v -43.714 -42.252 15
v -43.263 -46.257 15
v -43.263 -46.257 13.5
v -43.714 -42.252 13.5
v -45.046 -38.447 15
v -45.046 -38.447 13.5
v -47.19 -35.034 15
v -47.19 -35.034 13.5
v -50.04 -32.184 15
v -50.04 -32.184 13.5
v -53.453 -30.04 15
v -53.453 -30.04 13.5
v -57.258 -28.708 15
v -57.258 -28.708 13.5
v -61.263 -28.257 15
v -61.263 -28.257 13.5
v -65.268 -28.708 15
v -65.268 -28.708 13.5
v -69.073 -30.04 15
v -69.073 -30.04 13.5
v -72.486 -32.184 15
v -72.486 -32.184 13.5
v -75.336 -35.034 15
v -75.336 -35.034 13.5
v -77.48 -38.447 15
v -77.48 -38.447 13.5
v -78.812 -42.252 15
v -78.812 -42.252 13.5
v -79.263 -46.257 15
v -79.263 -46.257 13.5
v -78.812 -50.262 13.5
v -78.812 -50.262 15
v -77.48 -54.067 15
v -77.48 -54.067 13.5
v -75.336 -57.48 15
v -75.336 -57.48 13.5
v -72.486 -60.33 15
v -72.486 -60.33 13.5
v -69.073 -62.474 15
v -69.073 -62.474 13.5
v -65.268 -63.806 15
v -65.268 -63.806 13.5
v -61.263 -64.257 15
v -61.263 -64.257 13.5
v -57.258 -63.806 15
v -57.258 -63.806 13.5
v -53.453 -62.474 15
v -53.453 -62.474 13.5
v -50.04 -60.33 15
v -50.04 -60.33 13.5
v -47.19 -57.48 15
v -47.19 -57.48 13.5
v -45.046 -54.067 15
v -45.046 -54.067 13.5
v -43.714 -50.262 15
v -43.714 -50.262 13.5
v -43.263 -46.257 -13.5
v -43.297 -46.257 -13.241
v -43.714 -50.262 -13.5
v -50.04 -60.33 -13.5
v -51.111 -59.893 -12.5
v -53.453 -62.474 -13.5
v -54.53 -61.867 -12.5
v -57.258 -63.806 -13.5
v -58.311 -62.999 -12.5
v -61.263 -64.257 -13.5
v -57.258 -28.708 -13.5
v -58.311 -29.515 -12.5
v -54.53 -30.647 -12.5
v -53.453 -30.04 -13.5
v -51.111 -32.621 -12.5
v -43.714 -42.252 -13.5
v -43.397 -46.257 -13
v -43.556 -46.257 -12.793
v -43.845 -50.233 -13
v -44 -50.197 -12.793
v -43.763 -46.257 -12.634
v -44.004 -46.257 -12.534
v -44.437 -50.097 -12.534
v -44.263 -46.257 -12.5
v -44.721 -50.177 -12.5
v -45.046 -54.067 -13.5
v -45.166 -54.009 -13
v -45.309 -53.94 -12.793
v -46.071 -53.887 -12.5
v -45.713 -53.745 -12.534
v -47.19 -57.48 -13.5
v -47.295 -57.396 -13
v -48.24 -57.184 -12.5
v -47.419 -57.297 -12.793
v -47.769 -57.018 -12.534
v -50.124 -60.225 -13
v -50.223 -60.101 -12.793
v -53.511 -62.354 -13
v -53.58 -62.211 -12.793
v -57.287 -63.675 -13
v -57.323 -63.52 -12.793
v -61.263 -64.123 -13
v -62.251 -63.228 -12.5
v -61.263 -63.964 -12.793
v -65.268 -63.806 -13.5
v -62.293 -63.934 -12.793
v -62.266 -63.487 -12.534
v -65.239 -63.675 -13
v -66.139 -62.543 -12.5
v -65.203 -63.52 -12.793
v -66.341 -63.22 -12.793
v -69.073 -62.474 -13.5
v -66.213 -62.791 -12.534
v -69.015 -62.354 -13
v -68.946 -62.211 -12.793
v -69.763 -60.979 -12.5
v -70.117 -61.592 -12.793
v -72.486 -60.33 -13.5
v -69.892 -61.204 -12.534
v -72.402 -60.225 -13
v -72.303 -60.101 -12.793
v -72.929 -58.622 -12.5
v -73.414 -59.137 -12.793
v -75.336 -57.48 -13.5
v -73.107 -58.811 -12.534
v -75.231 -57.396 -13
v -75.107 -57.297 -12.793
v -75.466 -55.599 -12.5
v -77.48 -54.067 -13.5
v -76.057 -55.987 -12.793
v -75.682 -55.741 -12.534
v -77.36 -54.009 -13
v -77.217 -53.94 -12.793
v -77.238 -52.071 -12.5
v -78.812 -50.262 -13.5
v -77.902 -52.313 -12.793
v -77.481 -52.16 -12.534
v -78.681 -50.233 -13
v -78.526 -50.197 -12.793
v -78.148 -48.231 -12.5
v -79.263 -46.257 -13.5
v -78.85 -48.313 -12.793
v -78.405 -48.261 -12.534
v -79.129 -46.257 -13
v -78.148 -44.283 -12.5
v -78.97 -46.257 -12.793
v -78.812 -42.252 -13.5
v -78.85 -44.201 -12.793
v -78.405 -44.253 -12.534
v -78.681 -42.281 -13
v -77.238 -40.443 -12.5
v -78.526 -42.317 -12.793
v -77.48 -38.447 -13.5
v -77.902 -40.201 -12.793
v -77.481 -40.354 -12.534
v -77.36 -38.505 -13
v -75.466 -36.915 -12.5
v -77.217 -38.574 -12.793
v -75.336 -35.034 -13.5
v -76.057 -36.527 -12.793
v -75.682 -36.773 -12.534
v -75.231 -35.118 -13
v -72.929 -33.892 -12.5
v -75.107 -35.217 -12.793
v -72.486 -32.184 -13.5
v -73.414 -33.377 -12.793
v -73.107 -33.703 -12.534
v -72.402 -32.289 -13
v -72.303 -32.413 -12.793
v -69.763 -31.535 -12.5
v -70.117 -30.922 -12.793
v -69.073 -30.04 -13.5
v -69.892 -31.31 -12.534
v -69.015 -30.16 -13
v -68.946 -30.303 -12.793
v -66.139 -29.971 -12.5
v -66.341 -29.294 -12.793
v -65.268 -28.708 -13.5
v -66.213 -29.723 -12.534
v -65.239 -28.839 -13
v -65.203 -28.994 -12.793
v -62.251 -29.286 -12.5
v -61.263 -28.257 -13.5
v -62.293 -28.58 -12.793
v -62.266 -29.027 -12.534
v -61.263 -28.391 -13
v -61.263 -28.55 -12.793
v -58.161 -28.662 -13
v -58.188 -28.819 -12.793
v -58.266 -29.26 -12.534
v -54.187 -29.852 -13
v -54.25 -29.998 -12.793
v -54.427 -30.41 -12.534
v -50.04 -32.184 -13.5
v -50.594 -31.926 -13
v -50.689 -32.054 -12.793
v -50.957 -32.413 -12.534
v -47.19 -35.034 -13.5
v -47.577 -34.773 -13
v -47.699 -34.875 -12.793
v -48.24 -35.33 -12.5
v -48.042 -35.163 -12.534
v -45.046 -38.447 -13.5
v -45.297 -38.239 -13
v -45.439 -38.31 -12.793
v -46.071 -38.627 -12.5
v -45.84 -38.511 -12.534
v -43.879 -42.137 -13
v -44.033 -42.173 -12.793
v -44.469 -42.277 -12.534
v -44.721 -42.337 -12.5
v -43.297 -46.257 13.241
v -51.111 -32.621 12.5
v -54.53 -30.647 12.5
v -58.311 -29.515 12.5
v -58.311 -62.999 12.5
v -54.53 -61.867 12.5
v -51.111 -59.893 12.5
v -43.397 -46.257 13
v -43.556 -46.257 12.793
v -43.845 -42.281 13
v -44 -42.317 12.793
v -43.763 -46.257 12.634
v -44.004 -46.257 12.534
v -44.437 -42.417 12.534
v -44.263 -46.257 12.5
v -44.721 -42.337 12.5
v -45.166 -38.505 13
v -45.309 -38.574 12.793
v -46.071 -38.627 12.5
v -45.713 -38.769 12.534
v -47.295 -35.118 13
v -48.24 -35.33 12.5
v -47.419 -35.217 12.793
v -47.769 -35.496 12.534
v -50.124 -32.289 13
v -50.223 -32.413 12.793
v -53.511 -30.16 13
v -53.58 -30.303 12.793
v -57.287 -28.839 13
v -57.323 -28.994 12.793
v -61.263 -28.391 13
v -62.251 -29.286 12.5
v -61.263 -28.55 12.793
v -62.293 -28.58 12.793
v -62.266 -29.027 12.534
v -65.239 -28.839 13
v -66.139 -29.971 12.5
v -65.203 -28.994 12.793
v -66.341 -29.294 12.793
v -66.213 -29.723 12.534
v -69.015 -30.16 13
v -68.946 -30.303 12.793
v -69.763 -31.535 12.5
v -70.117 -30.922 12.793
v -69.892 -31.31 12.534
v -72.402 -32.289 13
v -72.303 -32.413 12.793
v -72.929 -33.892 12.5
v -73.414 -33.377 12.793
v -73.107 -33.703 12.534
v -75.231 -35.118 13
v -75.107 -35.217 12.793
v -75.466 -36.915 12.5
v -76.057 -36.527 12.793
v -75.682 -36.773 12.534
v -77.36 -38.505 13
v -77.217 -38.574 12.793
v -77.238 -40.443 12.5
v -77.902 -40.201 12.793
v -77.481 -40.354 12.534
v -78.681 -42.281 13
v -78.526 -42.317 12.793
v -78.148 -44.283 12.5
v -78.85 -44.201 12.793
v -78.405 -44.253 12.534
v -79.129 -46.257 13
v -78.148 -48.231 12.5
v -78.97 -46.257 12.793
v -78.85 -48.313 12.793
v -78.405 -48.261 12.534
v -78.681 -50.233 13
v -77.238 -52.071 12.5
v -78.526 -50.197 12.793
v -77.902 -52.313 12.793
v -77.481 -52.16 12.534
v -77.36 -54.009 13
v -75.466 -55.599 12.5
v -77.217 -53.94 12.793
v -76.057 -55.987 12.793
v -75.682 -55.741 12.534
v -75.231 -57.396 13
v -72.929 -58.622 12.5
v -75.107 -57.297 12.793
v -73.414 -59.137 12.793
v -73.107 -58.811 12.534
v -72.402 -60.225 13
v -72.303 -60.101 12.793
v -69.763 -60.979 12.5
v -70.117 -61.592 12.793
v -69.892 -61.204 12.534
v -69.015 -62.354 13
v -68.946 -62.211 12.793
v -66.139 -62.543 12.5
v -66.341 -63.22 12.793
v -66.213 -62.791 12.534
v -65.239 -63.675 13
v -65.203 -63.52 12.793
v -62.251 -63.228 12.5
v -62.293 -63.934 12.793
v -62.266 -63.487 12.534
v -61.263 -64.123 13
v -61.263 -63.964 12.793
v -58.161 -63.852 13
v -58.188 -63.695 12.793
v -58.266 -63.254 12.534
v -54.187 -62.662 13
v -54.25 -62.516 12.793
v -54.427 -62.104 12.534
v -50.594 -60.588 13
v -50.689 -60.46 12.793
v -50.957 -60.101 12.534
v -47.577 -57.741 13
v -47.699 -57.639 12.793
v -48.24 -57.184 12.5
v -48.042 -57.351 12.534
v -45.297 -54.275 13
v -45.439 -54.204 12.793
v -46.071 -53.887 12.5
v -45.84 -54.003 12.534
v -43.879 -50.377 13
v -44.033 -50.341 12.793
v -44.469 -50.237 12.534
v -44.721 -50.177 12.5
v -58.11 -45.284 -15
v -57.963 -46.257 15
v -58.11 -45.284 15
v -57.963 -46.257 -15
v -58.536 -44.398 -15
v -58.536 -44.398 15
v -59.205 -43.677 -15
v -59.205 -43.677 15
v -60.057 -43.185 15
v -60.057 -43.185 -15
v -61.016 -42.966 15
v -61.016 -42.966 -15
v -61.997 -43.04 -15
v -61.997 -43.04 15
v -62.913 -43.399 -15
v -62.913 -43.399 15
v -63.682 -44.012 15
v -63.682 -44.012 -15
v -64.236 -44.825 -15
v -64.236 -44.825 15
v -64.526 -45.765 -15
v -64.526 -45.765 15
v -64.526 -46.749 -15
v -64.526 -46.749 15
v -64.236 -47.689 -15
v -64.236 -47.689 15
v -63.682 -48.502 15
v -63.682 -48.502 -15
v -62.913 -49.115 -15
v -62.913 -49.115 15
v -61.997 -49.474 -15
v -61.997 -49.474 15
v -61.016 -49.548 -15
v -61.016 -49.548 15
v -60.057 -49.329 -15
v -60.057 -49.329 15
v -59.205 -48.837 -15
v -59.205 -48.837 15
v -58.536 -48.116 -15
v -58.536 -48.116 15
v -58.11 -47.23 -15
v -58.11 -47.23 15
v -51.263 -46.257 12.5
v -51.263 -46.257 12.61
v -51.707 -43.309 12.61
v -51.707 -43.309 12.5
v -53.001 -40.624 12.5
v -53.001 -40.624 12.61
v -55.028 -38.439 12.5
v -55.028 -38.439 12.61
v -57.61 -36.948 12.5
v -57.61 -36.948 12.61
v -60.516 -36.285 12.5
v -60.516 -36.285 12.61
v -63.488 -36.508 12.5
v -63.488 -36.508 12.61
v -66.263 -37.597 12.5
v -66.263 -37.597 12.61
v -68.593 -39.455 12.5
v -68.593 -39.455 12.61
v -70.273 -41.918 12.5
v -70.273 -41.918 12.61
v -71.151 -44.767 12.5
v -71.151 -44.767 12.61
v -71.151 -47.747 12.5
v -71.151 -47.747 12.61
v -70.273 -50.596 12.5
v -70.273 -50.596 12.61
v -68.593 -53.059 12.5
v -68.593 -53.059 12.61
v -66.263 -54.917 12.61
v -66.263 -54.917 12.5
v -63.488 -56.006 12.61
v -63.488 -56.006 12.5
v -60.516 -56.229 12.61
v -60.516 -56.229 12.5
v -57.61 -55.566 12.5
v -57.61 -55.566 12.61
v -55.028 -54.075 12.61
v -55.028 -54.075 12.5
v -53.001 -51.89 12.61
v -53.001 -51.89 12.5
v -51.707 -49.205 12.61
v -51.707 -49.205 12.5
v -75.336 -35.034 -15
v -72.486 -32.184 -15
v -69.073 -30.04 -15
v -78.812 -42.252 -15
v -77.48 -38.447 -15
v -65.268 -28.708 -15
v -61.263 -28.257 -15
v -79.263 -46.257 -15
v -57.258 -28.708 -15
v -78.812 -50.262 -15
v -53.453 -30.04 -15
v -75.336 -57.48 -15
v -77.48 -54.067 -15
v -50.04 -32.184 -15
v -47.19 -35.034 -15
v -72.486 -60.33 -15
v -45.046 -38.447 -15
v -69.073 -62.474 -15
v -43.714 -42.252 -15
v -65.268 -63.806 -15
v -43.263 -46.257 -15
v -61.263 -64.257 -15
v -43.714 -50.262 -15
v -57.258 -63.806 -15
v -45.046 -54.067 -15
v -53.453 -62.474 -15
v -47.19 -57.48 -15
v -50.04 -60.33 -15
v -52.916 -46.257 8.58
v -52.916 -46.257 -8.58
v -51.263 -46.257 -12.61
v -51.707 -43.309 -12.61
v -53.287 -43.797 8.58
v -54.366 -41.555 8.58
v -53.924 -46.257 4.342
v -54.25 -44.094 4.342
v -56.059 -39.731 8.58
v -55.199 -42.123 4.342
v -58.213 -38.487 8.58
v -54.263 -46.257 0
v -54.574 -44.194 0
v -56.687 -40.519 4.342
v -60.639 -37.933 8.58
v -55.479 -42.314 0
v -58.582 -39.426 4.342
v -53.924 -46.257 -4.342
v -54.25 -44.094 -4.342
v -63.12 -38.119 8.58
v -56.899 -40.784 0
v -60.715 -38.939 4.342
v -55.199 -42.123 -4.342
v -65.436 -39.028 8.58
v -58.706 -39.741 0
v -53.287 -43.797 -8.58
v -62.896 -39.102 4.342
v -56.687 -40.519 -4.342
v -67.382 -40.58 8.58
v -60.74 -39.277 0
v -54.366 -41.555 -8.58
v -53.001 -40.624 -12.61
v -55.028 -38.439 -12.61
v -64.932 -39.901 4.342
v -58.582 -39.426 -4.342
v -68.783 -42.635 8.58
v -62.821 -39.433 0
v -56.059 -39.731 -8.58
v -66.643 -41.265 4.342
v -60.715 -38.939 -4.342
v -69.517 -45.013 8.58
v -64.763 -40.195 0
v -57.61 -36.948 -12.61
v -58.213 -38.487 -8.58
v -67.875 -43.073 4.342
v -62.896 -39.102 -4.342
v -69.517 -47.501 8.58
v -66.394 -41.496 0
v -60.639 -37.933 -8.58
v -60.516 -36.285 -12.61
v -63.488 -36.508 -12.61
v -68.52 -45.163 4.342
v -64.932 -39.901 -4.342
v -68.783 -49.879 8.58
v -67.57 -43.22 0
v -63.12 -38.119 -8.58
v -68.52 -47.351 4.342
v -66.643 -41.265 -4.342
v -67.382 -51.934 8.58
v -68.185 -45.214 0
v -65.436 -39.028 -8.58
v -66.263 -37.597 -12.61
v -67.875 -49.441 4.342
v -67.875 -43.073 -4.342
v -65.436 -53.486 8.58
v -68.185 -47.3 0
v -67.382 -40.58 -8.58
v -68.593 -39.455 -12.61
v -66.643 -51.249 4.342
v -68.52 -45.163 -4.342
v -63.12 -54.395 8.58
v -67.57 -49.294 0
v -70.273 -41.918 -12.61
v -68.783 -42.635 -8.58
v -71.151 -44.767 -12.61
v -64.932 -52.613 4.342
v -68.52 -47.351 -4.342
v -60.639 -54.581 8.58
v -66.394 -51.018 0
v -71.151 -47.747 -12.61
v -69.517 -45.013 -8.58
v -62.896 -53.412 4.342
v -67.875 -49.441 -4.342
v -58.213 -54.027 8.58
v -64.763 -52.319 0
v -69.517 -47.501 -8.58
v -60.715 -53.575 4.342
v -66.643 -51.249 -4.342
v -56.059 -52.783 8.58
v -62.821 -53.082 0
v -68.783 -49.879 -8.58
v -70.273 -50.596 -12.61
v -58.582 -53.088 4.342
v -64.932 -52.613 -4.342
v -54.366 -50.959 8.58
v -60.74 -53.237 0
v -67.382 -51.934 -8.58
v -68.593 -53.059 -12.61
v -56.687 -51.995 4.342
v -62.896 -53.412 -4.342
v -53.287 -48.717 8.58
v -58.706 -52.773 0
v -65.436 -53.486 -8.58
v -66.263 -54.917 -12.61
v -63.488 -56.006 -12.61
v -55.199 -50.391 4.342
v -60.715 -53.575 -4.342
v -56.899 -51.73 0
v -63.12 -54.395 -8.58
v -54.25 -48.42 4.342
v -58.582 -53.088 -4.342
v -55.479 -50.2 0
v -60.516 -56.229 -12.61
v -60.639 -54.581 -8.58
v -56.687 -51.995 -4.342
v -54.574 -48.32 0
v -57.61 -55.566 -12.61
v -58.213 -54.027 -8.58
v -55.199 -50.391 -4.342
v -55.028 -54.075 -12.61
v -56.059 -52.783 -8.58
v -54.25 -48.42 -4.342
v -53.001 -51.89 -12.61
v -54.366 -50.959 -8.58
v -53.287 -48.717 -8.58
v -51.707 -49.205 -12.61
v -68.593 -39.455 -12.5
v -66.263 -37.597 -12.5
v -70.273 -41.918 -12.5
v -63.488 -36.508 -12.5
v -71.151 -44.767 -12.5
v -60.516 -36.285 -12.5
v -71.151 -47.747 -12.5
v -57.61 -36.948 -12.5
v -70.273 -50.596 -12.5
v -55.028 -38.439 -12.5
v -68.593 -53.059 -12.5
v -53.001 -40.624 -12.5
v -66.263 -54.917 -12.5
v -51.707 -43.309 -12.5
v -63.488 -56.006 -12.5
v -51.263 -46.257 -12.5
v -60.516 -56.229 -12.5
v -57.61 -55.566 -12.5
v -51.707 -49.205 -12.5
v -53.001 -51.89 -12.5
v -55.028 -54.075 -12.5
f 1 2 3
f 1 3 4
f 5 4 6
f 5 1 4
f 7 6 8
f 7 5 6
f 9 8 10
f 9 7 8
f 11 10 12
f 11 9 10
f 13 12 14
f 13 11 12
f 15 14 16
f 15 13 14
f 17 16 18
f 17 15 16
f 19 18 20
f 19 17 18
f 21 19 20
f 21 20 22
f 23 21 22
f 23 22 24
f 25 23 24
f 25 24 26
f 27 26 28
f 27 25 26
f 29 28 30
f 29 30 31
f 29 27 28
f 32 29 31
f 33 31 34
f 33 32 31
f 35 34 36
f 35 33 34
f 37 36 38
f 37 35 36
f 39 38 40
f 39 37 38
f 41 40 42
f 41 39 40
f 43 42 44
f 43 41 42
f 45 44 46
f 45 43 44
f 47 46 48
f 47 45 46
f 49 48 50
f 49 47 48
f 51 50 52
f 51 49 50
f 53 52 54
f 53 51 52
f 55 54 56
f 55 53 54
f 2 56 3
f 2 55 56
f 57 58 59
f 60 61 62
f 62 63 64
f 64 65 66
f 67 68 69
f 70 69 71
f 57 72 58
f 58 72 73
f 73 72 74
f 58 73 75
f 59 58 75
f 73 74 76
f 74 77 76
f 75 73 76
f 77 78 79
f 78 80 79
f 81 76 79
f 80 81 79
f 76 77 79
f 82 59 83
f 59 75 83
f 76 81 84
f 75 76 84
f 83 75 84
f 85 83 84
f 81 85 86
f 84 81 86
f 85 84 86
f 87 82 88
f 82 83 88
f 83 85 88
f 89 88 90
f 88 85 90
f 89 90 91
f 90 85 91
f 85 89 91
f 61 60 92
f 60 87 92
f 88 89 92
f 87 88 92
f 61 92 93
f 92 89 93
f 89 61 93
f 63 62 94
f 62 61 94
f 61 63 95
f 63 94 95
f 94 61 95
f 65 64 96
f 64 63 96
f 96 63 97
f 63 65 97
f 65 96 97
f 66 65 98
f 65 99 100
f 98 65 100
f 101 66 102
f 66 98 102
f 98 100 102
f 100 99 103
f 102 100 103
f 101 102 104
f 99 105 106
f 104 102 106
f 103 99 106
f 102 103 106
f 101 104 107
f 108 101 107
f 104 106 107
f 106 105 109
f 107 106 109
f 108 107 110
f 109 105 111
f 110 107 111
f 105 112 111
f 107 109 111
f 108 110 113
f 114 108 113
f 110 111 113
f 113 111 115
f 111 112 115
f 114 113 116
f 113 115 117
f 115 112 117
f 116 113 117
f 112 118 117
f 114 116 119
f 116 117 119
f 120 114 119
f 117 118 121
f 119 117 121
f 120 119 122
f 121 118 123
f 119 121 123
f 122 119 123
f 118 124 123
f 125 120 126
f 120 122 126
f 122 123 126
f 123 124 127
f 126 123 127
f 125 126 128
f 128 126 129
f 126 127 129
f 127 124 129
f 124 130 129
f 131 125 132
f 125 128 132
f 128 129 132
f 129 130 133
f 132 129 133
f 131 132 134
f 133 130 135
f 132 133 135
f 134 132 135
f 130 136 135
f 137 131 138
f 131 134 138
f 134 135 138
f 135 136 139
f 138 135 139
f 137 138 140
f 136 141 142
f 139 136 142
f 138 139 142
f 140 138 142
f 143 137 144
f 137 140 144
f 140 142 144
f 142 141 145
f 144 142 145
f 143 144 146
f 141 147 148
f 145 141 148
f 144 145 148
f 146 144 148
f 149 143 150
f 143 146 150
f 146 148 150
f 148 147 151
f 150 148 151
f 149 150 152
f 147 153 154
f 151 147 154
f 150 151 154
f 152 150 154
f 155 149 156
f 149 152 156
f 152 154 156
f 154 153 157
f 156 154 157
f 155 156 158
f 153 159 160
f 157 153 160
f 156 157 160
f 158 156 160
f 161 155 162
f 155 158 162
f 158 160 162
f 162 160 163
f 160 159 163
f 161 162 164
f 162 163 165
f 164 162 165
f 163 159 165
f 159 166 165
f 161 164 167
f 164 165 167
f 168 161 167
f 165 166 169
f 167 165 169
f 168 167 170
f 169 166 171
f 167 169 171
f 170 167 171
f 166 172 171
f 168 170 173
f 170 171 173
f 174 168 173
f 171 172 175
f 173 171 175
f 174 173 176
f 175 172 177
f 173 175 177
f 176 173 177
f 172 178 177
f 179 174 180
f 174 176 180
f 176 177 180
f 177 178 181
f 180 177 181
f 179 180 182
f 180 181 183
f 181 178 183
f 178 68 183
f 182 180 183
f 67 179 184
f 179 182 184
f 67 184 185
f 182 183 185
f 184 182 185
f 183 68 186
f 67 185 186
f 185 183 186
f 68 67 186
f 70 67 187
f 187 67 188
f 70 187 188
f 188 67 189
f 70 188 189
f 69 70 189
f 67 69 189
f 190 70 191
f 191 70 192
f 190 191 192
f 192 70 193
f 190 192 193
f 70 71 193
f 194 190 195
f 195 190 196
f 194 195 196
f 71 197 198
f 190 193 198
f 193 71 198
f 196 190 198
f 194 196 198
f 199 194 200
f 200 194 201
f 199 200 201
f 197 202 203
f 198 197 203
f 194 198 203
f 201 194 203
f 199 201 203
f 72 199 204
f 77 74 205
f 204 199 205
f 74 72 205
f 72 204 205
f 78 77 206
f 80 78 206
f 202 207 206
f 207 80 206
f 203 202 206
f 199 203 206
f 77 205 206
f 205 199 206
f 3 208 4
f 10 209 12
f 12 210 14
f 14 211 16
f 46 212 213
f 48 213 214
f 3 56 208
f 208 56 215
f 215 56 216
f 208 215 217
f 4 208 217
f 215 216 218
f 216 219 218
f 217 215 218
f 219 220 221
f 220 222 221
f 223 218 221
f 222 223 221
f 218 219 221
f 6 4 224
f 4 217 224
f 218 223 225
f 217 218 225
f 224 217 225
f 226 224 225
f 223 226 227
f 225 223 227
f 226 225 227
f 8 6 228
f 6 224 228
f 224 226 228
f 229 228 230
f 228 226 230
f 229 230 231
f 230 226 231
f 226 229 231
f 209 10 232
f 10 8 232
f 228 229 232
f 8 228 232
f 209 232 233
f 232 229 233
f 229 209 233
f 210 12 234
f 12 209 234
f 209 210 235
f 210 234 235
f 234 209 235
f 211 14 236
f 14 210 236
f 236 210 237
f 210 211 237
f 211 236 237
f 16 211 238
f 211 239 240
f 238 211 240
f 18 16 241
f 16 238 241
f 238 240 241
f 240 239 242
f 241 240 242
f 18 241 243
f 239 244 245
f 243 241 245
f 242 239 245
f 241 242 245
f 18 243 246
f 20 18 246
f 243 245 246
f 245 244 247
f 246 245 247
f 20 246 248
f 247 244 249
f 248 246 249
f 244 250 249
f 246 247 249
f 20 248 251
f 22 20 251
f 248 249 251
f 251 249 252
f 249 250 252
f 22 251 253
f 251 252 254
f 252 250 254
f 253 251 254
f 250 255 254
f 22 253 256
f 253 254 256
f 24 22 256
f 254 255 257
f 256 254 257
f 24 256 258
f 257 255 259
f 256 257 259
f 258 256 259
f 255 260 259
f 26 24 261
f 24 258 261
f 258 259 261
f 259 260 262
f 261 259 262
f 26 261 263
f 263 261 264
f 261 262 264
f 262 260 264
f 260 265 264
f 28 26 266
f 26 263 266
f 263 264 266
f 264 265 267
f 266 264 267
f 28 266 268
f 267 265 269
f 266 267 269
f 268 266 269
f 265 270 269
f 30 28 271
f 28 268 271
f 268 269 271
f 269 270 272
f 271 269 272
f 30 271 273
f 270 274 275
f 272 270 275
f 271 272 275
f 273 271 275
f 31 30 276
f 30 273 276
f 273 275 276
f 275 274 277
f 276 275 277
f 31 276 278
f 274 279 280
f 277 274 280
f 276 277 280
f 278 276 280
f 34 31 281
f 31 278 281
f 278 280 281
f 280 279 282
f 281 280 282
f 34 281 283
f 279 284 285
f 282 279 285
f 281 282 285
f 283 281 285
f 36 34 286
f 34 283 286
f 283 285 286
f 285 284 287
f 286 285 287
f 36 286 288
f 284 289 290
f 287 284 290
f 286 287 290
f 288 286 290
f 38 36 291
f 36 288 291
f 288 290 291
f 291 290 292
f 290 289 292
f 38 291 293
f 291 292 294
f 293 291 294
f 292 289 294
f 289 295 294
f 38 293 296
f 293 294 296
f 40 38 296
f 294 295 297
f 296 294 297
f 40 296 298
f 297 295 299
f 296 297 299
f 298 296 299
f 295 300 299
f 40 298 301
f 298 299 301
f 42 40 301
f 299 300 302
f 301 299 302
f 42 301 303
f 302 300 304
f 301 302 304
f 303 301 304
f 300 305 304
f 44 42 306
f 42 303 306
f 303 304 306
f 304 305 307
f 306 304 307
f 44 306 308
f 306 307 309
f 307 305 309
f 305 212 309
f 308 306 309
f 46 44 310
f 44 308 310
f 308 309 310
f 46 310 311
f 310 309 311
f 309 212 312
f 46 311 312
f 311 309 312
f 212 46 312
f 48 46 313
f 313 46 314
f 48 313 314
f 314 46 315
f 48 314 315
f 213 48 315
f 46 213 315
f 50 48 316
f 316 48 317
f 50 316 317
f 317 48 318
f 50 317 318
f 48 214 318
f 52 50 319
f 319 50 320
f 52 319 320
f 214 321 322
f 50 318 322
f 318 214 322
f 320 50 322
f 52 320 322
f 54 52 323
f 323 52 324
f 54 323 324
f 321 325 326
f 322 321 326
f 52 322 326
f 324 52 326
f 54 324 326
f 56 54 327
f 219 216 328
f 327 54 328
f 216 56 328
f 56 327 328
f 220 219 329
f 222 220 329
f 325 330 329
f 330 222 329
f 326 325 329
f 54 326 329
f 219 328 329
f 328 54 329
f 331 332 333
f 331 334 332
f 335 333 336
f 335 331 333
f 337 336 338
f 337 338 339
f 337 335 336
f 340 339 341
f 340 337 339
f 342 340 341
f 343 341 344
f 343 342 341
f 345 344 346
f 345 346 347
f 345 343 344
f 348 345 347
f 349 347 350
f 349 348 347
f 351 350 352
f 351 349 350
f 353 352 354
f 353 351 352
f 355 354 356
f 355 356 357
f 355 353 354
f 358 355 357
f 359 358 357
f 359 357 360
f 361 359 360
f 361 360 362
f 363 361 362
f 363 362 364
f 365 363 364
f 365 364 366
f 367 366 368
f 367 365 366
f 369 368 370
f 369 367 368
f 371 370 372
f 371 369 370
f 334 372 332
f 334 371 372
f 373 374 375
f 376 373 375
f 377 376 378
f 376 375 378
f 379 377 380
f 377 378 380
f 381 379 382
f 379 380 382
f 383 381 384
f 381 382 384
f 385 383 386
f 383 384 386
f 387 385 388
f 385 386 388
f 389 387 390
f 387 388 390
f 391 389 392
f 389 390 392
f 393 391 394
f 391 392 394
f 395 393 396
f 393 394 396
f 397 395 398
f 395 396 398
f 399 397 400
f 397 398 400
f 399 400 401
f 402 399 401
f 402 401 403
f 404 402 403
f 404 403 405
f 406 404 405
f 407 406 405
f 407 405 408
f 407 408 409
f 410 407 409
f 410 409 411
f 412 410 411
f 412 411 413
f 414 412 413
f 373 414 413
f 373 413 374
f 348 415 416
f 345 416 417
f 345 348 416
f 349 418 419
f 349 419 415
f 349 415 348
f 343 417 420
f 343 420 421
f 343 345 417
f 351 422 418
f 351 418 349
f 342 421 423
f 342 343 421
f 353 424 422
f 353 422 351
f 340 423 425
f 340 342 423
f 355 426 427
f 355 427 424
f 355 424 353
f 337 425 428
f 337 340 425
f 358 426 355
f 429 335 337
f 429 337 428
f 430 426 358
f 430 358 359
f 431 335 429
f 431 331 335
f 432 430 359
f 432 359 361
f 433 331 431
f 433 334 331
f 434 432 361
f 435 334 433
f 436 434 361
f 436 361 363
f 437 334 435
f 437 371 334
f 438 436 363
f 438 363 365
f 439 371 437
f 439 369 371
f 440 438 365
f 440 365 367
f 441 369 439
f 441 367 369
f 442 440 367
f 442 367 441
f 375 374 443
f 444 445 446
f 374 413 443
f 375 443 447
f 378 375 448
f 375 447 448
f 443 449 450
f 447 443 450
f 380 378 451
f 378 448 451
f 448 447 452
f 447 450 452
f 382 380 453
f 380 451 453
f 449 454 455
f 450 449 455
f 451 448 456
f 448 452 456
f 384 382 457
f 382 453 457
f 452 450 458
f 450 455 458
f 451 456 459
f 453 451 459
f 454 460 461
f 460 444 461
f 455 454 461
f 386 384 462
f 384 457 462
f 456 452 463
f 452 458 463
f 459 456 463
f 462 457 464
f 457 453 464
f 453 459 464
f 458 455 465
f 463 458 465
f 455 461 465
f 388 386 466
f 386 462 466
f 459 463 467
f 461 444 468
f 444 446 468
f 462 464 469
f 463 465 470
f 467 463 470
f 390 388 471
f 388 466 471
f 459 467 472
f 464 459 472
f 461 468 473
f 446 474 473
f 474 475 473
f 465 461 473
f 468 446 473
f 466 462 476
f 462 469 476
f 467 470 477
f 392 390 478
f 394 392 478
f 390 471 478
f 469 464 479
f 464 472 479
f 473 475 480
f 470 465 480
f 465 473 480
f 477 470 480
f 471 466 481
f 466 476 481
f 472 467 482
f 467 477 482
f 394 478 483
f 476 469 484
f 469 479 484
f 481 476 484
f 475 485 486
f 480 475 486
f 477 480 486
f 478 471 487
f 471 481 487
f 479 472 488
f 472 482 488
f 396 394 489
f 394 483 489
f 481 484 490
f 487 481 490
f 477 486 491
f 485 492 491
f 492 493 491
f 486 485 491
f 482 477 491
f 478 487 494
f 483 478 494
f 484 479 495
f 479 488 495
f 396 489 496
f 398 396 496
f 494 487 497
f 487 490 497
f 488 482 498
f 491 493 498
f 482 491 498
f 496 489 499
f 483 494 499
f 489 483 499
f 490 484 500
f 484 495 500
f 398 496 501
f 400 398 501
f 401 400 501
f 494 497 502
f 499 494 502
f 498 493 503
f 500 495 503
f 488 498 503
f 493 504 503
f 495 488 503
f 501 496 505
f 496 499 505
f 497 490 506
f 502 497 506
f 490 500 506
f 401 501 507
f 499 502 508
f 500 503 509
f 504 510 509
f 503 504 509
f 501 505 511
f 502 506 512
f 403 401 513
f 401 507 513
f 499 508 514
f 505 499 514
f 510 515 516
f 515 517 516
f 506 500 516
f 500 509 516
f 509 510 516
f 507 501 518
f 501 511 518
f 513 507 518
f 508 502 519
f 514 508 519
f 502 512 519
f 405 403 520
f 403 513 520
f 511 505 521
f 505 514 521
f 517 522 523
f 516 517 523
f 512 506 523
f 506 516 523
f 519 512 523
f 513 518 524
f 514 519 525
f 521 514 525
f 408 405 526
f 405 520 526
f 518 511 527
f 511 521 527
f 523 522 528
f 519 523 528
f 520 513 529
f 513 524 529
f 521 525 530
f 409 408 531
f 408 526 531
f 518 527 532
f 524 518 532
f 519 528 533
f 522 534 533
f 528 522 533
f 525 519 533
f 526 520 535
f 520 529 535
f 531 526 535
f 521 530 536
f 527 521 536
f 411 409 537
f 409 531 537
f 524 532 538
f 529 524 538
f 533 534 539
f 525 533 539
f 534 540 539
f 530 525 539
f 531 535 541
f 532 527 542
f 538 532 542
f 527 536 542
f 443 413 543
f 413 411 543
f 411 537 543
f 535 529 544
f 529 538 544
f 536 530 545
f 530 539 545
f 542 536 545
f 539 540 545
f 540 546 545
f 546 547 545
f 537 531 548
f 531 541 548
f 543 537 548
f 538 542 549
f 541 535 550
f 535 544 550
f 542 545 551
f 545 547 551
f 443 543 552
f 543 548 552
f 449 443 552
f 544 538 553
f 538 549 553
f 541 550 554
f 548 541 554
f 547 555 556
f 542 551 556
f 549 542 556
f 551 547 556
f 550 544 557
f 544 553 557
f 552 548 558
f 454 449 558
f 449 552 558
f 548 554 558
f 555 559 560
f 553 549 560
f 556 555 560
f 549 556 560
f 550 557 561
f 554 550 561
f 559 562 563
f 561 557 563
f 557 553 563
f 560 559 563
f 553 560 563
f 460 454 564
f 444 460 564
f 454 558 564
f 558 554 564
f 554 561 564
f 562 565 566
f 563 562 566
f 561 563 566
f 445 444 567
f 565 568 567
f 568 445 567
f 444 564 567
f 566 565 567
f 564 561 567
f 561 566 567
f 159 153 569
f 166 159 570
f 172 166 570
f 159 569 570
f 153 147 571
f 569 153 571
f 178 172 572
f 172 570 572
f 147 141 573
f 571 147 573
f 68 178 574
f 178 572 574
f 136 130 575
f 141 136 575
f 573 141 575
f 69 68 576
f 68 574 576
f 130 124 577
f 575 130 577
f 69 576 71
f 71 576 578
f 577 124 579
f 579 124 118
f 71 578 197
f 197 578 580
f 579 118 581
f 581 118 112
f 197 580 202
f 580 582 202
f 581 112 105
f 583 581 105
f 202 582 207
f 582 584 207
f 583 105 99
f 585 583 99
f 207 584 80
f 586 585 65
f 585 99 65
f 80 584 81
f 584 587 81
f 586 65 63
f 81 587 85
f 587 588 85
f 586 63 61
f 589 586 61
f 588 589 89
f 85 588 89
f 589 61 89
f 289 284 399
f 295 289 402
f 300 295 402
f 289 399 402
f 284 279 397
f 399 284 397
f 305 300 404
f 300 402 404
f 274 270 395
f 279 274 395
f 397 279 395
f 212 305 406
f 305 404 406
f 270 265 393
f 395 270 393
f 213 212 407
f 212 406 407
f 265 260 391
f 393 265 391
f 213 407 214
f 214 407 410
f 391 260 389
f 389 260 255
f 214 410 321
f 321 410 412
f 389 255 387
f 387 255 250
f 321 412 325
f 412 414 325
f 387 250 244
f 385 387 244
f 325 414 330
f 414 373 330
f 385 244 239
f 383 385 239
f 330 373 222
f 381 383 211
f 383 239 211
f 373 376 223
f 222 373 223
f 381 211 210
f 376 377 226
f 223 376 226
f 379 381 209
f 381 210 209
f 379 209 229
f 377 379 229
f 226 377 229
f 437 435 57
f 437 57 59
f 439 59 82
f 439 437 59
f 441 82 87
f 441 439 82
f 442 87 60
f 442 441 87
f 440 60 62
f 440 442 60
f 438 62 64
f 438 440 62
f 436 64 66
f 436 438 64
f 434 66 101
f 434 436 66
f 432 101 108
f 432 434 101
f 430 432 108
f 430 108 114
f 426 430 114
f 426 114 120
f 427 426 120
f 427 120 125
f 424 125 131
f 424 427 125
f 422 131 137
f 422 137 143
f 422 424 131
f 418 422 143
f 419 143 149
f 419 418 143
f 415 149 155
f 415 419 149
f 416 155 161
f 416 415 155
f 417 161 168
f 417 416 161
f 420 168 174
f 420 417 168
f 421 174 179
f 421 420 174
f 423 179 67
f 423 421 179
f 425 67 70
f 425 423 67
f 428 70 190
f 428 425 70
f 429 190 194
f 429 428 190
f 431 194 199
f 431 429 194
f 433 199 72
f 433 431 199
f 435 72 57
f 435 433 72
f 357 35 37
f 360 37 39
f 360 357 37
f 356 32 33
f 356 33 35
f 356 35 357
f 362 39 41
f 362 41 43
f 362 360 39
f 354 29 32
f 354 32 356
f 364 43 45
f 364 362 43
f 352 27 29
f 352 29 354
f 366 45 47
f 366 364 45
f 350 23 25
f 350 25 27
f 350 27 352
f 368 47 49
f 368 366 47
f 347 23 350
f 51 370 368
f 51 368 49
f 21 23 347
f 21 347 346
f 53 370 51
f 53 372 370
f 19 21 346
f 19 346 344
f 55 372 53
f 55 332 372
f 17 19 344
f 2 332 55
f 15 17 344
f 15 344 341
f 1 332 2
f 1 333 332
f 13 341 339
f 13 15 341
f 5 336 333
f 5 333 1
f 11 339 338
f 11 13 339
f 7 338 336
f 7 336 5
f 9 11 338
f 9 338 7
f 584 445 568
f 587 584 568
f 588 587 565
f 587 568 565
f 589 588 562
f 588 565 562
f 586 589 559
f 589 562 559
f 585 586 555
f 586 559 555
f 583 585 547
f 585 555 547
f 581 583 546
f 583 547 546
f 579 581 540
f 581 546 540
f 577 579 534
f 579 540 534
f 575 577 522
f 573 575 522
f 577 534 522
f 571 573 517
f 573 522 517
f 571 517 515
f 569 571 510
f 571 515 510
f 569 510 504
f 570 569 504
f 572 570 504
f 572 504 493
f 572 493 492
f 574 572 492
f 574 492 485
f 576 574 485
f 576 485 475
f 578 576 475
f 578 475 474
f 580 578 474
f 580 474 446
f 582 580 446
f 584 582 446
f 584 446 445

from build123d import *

# Parameters (mm, degrees)
F0_R      = 10
F0_R_2    = 3.3
F1_DEPTH  = 15
F2_DEPTH  = 15
F4_R      = 28
F6_R      = 18
F6_R_2    = 10
F7_DEPTH  = 2.5
F8_R      = 1
F9_R      = 18
F9_R_2    = 10
F10_DEPTH = 2.5
F11_R     = 1


with BuildPart() as f1:
    # F0 (on Top) → F1 (new body)
    with BuildSketch(Plane.XY):
        with Locations((-61.262965, -46.257019)):
            Circle(F0_R)
        with Locations((-61.262965, -46.257019)):
            Circle(F0_R_2, mode=Mode.SUBTRACT)
    extrude(amount=F1_DEPTH)

    # F0 (on Top) → F2 (join)
    with BuildSketch(Plane.XY):
        with Locations((-61.262965, -46.257019)):
            Circle(F0_R)
        with Locations((-61.262965, -46.257019)):
            Circle(F0_R_2, mode=Mode.SUBTRACT)
    extrude(amount=-F2_DEPTH)

    # F5: sweep along a path in F0
    with BuildLine(Plane.XY) as f5_path:
        CenterArc((-61.262965, -46.257019), 10, 0, 360)
    # F4 (on face) → F5 (sweep, cut)
    with BuildSketch(Plane.XZ.offset(46.257019)):
        with Locations((-26.262965, 0)):
            Circle(F4_R)
    sweep(path=f5_path.line, mode=Mode.SUBTRACT)

    # F6 (on face) → F7 (join)
    with BuildSketch(Plane.XY.offset(15)):
        with Locations((-61.262965, -46.257019)):
            Circle(F6_R)
        with Locations((-61.262965, -46.257019)):
            Circle(F6_R_2, mode=Mode.SUBTRACT)
    extrude(amount=-F7_DEPTH)

    # F8
    f8_edges = [f1.edges().sort_by_distance(p)[0] for p in [
        (-79.262965, -46.257019, 12.5),
    ]]
    fillet(f8_edges, radius=F8_R)

    # F9 (on face) → F10 (join)
    with BuildSketch(Plane(origin=(0, 0, -15), x_dir=(1, 0, 0), z_dir=(0, 0, -1))):
        with Locations((-61.262965, 46.257019)):
            Circle(F9_R)
        with Locations((-61.262965, 46.257019)):
            Circle(F9_R_2, mode=Mode.SUBTRACT)
    extrude(amount=-F10_DEPTH)

    # F11
    f11_edges = [f1.edges().sort_by_distance(p)[0] for p in [
        (-79.262965, -46.257019, -12.5),
    ]]
    fillet(f11_edges, radius=F11_R)


solid = f1.part
